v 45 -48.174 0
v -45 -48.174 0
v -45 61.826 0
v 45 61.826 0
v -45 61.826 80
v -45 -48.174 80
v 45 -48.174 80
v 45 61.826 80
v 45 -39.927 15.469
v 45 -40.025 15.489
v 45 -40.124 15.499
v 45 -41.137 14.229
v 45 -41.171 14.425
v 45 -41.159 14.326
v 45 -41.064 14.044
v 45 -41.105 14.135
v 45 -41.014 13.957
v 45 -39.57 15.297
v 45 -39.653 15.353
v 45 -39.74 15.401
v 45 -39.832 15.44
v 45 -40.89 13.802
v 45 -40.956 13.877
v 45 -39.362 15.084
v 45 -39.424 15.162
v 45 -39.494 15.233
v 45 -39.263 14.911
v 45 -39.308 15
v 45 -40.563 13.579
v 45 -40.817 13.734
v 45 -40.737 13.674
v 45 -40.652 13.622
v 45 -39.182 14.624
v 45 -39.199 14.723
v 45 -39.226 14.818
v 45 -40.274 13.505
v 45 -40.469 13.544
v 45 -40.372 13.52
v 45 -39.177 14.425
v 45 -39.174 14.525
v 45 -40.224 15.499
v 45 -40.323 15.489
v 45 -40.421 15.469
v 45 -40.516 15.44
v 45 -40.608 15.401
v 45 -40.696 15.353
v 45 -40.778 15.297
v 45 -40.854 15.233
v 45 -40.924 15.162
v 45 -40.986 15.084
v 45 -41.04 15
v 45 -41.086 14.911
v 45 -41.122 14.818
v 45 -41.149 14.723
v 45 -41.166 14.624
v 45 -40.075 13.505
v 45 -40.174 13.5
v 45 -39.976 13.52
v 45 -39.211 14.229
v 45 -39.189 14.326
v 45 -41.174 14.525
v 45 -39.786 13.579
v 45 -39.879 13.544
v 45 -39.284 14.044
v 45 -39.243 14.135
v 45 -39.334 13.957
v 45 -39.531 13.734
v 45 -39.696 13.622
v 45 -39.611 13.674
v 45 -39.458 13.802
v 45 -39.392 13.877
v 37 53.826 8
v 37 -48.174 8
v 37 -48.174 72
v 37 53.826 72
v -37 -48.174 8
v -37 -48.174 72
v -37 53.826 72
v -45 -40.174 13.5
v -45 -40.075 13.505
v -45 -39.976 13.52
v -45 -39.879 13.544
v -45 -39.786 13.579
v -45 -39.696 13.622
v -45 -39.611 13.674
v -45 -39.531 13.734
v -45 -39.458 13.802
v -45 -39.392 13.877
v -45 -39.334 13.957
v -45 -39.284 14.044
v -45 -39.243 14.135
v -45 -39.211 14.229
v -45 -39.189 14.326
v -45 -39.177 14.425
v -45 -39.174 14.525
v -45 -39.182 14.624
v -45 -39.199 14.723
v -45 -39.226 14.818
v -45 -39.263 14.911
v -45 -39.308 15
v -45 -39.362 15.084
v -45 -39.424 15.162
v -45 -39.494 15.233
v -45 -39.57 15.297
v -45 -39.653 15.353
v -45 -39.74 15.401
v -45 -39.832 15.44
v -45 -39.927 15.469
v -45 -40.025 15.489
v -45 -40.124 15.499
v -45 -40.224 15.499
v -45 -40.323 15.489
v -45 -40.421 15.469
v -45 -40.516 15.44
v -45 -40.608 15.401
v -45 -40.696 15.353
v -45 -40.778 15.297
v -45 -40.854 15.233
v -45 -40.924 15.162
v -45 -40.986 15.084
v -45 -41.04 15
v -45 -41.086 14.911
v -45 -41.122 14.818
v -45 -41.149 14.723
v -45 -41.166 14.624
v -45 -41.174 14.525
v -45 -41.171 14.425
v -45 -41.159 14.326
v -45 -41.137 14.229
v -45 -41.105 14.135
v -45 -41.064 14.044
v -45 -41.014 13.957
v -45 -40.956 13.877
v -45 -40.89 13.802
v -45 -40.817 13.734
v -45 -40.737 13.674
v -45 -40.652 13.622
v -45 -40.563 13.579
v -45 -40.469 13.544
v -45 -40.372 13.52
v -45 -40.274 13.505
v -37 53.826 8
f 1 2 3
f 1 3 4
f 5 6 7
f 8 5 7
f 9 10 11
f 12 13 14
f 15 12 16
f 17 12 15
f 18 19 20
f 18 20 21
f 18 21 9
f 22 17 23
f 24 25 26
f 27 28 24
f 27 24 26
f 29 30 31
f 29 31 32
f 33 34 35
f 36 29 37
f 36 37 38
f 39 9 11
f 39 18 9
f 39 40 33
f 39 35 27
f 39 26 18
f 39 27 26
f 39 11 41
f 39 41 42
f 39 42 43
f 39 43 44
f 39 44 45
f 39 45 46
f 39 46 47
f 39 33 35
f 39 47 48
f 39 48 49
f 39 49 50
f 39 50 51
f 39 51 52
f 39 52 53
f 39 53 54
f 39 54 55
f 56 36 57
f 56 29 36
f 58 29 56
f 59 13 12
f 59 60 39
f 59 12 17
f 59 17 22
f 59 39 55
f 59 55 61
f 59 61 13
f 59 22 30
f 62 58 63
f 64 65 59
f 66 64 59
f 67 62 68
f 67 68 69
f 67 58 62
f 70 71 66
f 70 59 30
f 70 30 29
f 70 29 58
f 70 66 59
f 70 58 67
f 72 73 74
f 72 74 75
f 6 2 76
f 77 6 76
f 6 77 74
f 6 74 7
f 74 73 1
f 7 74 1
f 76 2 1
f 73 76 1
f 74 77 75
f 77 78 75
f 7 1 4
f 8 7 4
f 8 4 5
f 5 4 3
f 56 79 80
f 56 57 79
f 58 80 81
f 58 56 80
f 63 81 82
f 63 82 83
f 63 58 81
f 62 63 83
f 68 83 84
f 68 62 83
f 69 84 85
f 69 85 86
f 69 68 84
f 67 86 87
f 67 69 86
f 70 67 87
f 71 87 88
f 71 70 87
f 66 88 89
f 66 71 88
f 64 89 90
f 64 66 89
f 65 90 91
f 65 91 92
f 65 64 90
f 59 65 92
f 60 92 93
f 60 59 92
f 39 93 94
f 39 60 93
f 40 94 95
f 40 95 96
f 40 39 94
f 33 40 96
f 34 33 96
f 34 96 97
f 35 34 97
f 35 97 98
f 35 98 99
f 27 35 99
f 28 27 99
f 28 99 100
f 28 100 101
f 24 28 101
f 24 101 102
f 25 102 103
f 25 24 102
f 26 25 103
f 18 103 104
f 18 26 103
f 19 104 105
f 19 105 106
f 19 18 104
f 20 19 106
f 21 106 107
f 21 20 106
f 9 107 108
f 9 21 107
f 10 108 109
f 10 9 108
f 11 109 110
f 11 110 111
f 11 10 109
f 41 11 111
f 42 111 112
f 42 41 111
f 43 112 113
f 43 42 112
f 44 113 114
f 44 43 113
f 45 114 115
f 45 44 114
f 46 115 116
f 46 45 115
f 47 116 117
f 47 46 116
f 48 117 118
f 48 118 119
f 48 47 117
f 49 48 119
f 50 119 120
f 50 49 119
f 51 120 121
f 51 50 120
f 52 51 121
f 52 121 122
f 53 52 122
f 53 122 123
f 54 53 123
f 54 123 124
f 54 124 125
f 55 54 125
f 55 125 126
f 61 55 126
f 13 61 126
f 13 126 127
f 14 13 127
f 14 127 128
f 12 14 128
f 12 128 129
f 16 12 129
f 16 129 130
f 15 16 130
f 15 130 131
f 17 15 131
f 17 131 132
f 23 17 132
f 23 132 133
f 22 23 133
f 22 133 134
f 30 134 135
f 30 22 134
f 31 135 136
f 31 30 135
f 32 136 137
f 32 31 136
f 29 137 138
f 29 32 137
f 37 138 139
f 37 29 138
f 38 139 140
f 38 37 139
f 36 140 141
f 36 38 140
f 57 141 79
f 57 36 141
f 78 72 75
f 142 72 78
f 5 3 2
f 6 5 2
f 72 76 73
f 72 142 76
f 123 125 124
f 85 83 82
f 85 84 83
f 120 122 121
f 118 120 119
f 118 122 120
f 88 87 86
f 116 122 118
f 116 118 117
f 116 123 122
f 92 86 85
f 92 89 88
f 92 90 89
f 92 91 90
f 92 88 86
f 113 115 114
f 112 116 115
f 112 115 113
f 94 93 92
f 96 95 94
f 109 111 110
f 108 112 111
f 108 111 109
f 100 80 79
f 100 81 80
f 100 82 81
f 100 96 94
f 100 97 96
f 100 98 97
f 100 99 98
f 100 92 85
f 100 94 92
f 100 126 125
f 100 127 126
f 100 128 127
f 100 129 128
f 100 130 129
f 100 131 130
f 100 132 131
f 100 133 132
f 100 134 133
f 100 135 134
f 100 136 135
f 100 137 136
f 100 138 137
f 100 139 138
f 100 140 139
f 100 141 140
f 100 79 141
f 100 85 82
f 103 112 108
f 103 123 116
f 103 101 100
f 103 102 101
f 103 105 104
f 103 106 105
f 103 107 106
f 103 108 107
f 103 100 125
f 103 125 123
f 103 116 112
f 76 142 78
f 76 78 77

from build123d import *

# Parameters (mm, degrees)
F0_W     = 45
F0_H     = 102
F0_H_2   = 8
F1_DEPTH = 80
F2_T     = -8


# Not quite as in the source:
# - a feature names something its author has since deleted; it is built from what else it names


with BuildPart() as f1:
    # F0 (on Top) → F1 (new body)
    with BuildSketch(Plane.XY):
        with Locations((-22.5, 10.8258862279)):
            Rectangle(F0_W, F0_H)
        with Locations((22.5, 10.8258862279)):
            Rectangle(F0_W, F0_H)
        with Locations((22.5, -44.1741137721)):
            Rectangle(F0_W, F0_H_2)
        with Locations((-22.5, -44.1741137721)):
            Rectangle(F0_W, F0_H_2)
    extrude(amount=F1_DEPTH)

    # F2
    f2_openings = [f1.faces().sort_by_distance(p)[0] for p in [
        (0, -48.174114, 40),
    ]]
    offset(amount=F2_T, openings=f2_openings)


with BuildPart() as f6:
    # F5 (on 3pt) → F6 (revolve)
    with BuildSketch(Plane(origin=(4.3298e-06, -40.17411, 0), x_dir=(1, 1.078e-07, 0), z_dir=(1.078e-07, -1, 0))):
        Polygon((-45, 13.5), (0, 13.5), (45, 13.5), (45, 14.5), (0, 14.5), (-45, 14.5), align=None)
    revolve(axis=Axis((22.5000043298, -40.174107575, 14.5), (1, 1.078e-07, 0)))


solid = Compound([f1.part, f6.part])
